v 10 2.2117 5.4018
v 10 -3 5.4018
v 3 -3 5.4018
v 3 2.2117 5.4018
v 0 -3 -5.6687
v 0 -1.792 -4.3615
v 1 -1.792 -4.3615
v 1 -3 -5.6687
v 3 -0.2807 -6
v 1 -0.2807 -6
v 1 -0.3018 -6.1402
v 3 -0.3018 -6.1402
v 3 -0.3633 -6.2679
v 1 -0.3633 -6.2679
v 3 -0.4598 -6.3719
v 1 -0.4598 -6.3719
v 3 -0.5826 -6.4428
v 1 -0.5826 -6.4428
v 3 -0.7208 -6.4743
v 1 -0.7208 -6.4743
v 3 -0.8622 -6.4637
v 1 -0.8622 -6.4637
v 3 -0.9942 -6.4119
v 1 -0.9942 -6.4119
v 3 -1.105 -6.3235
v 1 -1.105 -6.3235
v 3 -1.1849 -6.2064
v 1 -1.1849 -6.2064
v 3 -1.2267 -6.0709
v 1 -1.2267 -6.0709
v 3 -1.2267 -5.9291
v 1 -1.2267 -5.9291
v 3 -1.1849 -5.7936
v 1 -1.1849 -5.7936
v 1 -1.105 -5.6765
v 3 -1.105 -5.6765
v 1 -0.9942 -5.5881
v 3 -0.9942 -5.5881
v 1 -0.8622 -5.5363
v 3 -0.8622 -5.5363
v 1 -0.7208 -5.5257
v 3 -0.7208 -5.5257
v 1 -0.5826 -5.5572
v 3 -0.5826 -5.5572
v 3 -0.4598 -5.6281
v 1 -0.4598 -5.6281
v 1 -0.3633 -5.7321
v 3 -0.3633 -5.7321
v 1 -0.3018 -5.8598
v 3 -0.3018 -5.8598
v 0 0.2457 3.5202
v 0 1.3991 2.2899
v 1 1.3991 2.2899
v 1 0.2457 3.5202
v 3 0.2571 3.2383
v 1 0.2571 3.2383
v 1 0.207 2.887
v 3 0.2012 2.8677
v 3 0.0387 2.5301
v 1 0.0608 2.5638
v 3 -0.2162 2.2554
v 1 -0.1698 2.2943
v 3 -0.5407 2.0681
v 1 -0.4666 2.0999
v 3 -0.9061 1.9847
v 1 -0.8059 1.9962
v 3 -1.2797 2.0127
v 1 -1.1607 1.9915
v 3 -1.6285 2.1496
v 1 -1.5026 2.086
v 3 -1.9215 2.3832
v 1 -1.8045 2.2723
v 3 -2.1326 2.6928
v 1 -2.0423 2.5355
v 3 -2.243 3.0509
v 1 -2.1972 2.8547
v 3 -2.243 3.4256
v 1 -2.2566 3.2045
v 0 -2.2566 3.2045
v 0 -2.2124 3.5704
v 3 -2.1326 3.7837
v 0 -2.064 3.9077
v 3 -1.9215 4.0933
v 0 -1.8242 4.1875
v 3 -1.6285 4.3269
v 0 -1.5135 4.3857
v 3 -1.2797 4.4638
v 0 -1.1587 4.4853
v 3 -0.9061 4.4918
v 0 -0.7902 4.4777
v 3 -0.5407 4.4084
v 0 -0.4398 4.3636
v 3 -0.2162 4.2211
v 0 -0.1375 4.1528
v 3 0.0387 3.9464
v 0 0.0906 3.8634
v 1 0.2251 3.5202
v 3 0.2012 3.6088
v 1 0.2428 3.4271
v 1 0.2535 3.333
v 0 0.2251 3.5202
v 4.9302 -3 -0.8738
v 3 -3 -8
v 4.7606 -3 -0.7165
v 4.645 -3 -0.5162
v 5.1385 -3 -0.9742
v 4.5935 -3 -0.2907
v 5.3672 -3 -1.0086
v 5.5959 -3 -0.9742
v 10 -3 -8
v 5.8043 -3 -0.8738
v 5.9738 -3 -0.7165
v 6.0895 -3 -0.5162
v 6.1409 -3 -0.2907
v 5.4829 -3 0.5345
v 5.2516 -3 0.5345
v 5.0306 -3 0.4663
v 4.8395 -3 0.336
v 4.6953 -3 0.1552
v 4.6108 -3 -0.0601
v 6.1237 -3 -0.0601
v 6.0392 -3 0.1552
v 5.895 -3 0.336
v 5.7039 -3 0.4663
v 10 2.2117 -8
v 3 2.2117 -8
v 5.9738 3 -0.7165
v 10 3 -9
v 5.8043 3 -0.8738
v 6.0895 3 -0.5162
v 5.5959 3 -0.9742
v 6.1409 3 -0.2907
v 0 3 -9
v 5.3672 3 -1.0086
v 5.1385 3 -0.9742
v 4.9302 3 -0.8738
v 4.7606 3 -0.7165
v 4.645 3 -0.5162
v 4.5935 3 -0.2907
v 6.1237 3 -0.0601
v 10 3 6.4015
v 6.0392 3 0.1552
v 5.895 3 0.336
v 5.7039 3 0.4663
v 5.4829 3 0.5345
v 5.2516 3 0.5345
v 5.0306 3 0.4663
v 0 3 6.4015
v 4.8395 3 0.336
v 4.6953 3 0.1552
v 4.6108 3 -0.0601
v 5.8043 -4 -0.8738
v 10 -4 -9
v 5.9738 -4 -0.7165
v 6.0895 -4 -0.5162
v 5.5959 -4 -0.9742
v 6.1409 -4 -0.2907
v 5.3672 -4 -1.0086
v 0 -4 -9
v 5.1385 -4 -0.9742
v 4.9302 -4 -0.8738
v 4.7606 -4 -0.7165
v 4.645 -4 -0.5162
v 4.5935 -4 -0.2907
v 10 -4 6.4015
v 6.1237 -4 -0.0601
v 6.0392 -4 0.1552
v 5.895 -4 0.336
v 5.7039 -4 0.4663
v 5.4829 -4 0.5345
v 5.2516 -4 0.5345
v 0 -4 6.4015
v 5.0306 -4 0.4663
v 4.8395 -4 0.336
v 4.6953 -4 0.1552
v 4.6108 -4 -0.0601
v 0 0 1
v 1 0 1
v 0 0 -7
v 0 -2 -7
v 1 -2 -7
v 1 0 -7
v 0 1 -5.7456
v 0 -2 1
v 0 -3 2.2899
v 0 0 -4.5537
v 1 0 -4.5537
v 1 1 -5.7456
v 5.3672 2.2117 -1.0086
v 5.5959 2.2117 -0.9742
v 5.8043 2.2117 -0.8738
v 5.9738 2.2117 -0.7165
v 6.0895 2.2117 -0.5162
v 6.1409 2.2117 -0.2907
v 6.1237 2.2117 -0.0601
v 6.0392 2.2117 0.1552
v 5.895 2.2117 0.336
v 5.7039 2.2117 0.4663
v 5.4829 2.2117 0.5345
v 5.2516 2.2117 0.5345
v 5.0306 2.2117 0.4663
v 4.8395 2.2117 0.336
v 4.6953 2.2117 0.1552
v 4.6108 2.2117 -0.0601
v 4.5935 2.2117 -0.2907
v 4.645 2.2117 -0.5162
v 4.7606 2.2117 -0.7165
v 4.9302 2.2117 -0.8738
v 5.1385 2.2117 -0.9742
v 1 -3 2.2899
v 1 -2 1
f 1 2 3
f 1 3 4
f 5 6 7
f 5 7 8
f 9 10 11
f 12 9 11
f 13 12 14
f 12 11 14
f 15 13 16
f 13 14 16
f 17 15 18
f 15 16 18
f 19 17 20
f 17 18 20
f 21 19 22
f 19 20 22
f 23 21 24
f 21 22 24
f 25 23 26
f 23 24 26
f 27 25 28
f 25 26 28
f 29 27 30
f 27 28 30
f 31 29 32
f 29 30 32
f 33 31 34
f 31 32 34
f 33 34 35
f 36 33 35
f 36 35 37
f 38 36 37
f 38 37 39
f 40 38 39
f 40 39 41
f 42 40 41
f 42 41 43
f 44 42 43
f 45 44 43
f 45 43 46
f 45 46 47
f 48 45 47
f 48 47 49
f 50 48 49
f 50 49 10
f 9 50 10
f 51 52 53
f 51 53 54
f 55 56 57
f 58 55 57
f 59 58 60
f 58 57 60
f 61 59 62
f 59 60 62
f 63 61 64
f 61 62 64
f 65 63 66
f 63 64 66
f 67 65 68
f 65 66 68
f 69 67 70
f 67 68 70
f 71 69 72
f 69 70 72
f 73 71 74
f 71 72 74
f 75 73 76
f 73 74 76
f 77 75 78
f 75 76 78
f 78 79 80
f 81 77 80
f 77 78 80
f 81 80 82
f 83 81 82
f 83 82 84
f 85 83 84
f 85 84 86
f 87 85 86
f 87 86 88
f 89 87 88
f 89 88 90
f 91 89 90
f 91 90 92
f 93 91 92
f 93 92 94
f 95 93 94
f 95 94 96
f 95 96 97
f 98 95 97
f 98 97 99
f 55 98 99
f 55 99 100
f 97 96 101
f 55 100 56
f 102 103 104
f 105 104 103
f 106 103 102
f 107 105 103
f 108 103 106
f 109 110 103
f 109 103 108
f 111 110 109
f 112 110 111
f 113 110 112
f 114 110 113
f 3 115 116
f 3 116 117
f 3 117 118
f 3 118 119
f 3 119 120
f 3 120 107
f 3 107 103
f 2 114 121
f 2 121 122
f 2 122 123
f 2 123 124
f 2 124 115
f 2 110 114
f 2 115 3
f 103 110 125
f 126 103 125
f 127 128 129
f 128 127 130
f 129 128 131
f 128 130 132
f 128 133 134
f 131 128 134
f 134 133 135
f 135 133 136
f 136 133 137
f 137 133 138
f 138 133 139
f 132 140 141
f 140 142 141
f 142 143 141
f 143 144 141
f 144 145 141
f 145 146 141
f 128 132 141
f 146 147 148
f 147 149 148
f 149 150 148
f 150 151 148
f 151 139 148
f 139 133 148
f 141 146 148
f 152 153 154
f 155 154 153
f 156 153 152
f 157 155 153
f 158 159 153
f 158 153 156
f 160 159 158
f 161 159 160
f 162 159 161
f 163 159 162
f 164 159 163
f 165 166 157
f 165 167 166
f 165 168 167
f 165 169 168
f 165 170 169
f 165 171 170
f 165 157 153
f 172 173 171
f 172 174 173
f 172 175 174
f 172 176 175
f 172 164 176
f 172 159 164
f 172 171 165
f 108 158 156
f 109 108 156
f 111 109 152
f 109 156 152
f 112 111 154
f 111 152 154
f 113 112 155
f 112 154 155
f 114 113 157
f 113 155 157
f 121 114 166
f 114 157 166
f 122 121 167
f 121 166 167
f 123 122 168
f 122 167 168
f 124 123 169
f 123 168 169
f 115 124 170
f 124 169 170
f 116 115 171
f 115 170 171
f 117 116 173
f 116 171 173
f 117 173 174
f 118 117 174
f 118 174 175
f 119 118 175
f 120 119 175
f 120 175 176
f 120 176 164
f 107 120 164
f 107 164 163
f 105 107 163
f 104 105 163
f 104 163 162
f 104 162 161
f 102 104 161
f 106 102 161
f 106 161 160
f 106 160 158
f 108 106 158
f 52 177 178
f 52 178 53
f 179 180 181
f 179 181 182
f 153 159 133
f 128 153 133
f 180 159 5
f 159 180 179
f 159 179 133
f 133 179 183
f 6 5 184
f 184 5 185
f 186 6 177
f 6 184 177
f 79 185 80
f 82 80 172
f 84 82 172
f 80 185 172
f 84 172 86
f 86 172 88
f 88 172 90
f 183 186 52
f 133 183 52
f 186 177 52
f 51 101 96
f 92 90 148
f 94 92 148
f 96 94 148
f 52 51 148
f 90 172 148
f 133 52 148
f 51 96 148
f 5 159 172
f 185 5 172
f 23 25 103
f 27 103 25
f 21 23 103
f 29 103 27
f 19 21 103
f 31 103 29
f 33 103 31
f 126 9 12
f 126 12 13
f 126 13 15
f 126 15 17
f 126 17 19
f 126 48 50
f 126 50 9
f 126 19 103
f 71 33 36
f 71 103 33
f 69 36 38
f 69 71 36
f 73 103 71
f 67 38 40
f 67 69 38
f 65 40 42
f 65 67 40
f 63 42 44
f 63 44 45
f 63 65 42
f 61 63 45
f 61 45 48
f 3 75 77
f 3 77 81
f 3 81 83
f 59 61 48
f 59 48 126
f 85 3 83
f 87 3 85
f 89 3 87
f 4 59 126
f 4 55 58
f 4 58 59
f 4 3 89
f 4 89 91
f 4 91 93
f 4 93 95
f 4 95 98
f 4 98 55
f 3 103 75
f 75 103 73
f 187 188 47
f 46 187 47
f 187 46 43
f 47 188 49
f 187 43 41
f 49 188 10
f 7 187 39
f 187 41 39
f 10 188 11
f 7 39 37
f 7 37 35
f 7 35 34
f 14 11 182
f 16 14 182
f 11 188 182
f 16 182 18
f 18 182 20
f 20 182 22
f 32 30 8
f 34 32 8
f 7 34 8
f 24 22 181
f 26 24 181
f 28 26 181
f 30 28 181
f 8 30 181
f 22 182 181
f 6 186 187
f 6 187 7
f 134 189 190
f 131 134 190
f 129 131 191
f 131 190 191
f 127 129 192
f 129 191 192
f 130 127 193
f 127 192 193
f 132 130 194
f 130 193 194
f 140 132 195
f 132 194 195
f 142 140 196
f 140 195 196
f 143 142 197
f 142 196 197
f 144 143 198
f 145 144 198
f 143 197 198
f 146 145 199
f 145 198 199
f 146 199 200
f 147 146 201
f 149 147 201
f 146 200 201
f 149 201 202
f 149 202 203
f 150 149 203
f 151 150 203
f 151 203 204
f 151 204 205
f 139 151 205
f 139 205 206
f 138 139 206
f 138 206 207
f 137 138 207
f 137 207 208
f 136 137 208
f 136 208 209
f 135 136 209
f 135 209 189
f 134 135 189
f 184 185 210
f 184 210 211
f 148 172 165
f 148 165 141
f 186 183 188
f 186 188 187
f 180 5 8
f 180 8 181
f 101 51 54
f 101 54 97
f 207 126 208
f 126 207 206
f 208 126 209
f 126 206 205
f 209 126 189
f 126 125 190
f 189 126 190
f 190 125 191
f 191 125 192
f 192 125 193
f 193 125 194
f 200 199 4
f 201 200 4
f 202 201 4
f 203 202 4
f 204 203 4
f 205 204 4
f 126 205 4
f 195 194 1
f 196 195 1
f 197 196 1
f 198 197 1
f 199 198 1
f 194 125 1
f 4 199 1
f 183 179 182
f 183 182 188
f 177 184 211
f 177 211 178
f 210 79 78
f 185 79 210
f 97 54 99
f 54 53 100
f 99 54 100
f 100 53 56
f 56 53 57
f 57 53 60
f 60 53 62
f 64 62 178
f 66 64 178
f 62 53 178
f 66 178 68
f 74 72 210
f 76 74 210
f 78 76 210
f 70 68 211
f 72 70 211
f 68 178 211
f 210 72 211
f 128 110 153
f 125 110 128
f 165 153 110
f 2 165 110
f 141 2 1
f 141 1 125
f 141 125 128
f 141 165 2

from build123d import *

# Parameters (mm, degrees)
SKETCH_W        = 7
SKETCH_H        = 15.401475
PAD_DEPTH       = 10
SKETCH001_W     = 5.211703
SKETCH001_H     = 13.401846
POCKET_DEPTH    = 7
SKETCH002_R     = 0.775886
POCKET001_DEPTH = 7.001
SKETCH003_R     = 0.475645
SKETCH003_R_2   = 1.257083
POCKET002_DEPTH = 10.001
POCKET003_DEPTH = 1


with BuildPart() as part:
    # Sketch → Pad (new body)
    with BuildSketch(Plane.YZ):
        with Locations((-0.5, -1.299263)):
            Rectangle(SKETCH_W, SKETCH_H)
    extrude(amount=PAD_DEPTH)

    # Sketch001 (on Face6 of Pad) → Pocket (cut)
    with BuildSketch(Plane.YZ.offset(10)):
        with Locations((-0.394149, -1.299077)):
            Rectangle(SKETCH001_W, SKETCH001_H)
    extrude(amount=-POCKET_DEPTH, mode=Mode.SUBTRACT)

    # Sketch002 (on Face2 of Pocket) → Pocket001 (cut, through all)
    with BuildSketch(Plane(origin=(0, -4, 0), x_dir=(0, 0, -1), z_dir=(0, -1, 0))):
        with Locations((0.232735, 5.367224)):
            Circle(SKETCH002_R)
    extrude(amount=-POCKET001_DEPTH, mode=Mode.SUBTRACT)

    # Sketch003 (on Face4 of Pocket001) → Pocket002 (cut, through all)
    with BuildSketch(Plane(origin=(0, 0, 0), x_dir=(0, 1, 0), z_dir=(-1, 0, 0))):
        with Locations((-0.756336, 6)):
            Circle(SKETCH003_R)
        with Locations((-1, -3.238254)):
            Circle(SKETCH003_R_2)
    extrude(amount=-POCKET002_DEPTH, mode=Mode.SUBTRACT)

    # Sketch004 (on Face4 of Pocket002) → Pocket003 (cut)
    with BuildSketch(Plane(origin=(0, 0, 0), x_dir=(0, 1, 0), z_dir=(-1, 0, 0))):
        Polygon((-2, 7), (0, 7), (1, 5.745577), (0, 4.55371), (-1.792042, 4.361475), (-3, 5.668684), align=None)
        Polygon((-2, -1), (0, -1), (1.399085, -2.289909), (0.245664, -3.520222), (-2, -3.520222), (-3, -2.289909), align=None)
    extrude(amount=-POCKET003_DEPTH, mode=Mode.SUBTRACT)


solid = part.part
